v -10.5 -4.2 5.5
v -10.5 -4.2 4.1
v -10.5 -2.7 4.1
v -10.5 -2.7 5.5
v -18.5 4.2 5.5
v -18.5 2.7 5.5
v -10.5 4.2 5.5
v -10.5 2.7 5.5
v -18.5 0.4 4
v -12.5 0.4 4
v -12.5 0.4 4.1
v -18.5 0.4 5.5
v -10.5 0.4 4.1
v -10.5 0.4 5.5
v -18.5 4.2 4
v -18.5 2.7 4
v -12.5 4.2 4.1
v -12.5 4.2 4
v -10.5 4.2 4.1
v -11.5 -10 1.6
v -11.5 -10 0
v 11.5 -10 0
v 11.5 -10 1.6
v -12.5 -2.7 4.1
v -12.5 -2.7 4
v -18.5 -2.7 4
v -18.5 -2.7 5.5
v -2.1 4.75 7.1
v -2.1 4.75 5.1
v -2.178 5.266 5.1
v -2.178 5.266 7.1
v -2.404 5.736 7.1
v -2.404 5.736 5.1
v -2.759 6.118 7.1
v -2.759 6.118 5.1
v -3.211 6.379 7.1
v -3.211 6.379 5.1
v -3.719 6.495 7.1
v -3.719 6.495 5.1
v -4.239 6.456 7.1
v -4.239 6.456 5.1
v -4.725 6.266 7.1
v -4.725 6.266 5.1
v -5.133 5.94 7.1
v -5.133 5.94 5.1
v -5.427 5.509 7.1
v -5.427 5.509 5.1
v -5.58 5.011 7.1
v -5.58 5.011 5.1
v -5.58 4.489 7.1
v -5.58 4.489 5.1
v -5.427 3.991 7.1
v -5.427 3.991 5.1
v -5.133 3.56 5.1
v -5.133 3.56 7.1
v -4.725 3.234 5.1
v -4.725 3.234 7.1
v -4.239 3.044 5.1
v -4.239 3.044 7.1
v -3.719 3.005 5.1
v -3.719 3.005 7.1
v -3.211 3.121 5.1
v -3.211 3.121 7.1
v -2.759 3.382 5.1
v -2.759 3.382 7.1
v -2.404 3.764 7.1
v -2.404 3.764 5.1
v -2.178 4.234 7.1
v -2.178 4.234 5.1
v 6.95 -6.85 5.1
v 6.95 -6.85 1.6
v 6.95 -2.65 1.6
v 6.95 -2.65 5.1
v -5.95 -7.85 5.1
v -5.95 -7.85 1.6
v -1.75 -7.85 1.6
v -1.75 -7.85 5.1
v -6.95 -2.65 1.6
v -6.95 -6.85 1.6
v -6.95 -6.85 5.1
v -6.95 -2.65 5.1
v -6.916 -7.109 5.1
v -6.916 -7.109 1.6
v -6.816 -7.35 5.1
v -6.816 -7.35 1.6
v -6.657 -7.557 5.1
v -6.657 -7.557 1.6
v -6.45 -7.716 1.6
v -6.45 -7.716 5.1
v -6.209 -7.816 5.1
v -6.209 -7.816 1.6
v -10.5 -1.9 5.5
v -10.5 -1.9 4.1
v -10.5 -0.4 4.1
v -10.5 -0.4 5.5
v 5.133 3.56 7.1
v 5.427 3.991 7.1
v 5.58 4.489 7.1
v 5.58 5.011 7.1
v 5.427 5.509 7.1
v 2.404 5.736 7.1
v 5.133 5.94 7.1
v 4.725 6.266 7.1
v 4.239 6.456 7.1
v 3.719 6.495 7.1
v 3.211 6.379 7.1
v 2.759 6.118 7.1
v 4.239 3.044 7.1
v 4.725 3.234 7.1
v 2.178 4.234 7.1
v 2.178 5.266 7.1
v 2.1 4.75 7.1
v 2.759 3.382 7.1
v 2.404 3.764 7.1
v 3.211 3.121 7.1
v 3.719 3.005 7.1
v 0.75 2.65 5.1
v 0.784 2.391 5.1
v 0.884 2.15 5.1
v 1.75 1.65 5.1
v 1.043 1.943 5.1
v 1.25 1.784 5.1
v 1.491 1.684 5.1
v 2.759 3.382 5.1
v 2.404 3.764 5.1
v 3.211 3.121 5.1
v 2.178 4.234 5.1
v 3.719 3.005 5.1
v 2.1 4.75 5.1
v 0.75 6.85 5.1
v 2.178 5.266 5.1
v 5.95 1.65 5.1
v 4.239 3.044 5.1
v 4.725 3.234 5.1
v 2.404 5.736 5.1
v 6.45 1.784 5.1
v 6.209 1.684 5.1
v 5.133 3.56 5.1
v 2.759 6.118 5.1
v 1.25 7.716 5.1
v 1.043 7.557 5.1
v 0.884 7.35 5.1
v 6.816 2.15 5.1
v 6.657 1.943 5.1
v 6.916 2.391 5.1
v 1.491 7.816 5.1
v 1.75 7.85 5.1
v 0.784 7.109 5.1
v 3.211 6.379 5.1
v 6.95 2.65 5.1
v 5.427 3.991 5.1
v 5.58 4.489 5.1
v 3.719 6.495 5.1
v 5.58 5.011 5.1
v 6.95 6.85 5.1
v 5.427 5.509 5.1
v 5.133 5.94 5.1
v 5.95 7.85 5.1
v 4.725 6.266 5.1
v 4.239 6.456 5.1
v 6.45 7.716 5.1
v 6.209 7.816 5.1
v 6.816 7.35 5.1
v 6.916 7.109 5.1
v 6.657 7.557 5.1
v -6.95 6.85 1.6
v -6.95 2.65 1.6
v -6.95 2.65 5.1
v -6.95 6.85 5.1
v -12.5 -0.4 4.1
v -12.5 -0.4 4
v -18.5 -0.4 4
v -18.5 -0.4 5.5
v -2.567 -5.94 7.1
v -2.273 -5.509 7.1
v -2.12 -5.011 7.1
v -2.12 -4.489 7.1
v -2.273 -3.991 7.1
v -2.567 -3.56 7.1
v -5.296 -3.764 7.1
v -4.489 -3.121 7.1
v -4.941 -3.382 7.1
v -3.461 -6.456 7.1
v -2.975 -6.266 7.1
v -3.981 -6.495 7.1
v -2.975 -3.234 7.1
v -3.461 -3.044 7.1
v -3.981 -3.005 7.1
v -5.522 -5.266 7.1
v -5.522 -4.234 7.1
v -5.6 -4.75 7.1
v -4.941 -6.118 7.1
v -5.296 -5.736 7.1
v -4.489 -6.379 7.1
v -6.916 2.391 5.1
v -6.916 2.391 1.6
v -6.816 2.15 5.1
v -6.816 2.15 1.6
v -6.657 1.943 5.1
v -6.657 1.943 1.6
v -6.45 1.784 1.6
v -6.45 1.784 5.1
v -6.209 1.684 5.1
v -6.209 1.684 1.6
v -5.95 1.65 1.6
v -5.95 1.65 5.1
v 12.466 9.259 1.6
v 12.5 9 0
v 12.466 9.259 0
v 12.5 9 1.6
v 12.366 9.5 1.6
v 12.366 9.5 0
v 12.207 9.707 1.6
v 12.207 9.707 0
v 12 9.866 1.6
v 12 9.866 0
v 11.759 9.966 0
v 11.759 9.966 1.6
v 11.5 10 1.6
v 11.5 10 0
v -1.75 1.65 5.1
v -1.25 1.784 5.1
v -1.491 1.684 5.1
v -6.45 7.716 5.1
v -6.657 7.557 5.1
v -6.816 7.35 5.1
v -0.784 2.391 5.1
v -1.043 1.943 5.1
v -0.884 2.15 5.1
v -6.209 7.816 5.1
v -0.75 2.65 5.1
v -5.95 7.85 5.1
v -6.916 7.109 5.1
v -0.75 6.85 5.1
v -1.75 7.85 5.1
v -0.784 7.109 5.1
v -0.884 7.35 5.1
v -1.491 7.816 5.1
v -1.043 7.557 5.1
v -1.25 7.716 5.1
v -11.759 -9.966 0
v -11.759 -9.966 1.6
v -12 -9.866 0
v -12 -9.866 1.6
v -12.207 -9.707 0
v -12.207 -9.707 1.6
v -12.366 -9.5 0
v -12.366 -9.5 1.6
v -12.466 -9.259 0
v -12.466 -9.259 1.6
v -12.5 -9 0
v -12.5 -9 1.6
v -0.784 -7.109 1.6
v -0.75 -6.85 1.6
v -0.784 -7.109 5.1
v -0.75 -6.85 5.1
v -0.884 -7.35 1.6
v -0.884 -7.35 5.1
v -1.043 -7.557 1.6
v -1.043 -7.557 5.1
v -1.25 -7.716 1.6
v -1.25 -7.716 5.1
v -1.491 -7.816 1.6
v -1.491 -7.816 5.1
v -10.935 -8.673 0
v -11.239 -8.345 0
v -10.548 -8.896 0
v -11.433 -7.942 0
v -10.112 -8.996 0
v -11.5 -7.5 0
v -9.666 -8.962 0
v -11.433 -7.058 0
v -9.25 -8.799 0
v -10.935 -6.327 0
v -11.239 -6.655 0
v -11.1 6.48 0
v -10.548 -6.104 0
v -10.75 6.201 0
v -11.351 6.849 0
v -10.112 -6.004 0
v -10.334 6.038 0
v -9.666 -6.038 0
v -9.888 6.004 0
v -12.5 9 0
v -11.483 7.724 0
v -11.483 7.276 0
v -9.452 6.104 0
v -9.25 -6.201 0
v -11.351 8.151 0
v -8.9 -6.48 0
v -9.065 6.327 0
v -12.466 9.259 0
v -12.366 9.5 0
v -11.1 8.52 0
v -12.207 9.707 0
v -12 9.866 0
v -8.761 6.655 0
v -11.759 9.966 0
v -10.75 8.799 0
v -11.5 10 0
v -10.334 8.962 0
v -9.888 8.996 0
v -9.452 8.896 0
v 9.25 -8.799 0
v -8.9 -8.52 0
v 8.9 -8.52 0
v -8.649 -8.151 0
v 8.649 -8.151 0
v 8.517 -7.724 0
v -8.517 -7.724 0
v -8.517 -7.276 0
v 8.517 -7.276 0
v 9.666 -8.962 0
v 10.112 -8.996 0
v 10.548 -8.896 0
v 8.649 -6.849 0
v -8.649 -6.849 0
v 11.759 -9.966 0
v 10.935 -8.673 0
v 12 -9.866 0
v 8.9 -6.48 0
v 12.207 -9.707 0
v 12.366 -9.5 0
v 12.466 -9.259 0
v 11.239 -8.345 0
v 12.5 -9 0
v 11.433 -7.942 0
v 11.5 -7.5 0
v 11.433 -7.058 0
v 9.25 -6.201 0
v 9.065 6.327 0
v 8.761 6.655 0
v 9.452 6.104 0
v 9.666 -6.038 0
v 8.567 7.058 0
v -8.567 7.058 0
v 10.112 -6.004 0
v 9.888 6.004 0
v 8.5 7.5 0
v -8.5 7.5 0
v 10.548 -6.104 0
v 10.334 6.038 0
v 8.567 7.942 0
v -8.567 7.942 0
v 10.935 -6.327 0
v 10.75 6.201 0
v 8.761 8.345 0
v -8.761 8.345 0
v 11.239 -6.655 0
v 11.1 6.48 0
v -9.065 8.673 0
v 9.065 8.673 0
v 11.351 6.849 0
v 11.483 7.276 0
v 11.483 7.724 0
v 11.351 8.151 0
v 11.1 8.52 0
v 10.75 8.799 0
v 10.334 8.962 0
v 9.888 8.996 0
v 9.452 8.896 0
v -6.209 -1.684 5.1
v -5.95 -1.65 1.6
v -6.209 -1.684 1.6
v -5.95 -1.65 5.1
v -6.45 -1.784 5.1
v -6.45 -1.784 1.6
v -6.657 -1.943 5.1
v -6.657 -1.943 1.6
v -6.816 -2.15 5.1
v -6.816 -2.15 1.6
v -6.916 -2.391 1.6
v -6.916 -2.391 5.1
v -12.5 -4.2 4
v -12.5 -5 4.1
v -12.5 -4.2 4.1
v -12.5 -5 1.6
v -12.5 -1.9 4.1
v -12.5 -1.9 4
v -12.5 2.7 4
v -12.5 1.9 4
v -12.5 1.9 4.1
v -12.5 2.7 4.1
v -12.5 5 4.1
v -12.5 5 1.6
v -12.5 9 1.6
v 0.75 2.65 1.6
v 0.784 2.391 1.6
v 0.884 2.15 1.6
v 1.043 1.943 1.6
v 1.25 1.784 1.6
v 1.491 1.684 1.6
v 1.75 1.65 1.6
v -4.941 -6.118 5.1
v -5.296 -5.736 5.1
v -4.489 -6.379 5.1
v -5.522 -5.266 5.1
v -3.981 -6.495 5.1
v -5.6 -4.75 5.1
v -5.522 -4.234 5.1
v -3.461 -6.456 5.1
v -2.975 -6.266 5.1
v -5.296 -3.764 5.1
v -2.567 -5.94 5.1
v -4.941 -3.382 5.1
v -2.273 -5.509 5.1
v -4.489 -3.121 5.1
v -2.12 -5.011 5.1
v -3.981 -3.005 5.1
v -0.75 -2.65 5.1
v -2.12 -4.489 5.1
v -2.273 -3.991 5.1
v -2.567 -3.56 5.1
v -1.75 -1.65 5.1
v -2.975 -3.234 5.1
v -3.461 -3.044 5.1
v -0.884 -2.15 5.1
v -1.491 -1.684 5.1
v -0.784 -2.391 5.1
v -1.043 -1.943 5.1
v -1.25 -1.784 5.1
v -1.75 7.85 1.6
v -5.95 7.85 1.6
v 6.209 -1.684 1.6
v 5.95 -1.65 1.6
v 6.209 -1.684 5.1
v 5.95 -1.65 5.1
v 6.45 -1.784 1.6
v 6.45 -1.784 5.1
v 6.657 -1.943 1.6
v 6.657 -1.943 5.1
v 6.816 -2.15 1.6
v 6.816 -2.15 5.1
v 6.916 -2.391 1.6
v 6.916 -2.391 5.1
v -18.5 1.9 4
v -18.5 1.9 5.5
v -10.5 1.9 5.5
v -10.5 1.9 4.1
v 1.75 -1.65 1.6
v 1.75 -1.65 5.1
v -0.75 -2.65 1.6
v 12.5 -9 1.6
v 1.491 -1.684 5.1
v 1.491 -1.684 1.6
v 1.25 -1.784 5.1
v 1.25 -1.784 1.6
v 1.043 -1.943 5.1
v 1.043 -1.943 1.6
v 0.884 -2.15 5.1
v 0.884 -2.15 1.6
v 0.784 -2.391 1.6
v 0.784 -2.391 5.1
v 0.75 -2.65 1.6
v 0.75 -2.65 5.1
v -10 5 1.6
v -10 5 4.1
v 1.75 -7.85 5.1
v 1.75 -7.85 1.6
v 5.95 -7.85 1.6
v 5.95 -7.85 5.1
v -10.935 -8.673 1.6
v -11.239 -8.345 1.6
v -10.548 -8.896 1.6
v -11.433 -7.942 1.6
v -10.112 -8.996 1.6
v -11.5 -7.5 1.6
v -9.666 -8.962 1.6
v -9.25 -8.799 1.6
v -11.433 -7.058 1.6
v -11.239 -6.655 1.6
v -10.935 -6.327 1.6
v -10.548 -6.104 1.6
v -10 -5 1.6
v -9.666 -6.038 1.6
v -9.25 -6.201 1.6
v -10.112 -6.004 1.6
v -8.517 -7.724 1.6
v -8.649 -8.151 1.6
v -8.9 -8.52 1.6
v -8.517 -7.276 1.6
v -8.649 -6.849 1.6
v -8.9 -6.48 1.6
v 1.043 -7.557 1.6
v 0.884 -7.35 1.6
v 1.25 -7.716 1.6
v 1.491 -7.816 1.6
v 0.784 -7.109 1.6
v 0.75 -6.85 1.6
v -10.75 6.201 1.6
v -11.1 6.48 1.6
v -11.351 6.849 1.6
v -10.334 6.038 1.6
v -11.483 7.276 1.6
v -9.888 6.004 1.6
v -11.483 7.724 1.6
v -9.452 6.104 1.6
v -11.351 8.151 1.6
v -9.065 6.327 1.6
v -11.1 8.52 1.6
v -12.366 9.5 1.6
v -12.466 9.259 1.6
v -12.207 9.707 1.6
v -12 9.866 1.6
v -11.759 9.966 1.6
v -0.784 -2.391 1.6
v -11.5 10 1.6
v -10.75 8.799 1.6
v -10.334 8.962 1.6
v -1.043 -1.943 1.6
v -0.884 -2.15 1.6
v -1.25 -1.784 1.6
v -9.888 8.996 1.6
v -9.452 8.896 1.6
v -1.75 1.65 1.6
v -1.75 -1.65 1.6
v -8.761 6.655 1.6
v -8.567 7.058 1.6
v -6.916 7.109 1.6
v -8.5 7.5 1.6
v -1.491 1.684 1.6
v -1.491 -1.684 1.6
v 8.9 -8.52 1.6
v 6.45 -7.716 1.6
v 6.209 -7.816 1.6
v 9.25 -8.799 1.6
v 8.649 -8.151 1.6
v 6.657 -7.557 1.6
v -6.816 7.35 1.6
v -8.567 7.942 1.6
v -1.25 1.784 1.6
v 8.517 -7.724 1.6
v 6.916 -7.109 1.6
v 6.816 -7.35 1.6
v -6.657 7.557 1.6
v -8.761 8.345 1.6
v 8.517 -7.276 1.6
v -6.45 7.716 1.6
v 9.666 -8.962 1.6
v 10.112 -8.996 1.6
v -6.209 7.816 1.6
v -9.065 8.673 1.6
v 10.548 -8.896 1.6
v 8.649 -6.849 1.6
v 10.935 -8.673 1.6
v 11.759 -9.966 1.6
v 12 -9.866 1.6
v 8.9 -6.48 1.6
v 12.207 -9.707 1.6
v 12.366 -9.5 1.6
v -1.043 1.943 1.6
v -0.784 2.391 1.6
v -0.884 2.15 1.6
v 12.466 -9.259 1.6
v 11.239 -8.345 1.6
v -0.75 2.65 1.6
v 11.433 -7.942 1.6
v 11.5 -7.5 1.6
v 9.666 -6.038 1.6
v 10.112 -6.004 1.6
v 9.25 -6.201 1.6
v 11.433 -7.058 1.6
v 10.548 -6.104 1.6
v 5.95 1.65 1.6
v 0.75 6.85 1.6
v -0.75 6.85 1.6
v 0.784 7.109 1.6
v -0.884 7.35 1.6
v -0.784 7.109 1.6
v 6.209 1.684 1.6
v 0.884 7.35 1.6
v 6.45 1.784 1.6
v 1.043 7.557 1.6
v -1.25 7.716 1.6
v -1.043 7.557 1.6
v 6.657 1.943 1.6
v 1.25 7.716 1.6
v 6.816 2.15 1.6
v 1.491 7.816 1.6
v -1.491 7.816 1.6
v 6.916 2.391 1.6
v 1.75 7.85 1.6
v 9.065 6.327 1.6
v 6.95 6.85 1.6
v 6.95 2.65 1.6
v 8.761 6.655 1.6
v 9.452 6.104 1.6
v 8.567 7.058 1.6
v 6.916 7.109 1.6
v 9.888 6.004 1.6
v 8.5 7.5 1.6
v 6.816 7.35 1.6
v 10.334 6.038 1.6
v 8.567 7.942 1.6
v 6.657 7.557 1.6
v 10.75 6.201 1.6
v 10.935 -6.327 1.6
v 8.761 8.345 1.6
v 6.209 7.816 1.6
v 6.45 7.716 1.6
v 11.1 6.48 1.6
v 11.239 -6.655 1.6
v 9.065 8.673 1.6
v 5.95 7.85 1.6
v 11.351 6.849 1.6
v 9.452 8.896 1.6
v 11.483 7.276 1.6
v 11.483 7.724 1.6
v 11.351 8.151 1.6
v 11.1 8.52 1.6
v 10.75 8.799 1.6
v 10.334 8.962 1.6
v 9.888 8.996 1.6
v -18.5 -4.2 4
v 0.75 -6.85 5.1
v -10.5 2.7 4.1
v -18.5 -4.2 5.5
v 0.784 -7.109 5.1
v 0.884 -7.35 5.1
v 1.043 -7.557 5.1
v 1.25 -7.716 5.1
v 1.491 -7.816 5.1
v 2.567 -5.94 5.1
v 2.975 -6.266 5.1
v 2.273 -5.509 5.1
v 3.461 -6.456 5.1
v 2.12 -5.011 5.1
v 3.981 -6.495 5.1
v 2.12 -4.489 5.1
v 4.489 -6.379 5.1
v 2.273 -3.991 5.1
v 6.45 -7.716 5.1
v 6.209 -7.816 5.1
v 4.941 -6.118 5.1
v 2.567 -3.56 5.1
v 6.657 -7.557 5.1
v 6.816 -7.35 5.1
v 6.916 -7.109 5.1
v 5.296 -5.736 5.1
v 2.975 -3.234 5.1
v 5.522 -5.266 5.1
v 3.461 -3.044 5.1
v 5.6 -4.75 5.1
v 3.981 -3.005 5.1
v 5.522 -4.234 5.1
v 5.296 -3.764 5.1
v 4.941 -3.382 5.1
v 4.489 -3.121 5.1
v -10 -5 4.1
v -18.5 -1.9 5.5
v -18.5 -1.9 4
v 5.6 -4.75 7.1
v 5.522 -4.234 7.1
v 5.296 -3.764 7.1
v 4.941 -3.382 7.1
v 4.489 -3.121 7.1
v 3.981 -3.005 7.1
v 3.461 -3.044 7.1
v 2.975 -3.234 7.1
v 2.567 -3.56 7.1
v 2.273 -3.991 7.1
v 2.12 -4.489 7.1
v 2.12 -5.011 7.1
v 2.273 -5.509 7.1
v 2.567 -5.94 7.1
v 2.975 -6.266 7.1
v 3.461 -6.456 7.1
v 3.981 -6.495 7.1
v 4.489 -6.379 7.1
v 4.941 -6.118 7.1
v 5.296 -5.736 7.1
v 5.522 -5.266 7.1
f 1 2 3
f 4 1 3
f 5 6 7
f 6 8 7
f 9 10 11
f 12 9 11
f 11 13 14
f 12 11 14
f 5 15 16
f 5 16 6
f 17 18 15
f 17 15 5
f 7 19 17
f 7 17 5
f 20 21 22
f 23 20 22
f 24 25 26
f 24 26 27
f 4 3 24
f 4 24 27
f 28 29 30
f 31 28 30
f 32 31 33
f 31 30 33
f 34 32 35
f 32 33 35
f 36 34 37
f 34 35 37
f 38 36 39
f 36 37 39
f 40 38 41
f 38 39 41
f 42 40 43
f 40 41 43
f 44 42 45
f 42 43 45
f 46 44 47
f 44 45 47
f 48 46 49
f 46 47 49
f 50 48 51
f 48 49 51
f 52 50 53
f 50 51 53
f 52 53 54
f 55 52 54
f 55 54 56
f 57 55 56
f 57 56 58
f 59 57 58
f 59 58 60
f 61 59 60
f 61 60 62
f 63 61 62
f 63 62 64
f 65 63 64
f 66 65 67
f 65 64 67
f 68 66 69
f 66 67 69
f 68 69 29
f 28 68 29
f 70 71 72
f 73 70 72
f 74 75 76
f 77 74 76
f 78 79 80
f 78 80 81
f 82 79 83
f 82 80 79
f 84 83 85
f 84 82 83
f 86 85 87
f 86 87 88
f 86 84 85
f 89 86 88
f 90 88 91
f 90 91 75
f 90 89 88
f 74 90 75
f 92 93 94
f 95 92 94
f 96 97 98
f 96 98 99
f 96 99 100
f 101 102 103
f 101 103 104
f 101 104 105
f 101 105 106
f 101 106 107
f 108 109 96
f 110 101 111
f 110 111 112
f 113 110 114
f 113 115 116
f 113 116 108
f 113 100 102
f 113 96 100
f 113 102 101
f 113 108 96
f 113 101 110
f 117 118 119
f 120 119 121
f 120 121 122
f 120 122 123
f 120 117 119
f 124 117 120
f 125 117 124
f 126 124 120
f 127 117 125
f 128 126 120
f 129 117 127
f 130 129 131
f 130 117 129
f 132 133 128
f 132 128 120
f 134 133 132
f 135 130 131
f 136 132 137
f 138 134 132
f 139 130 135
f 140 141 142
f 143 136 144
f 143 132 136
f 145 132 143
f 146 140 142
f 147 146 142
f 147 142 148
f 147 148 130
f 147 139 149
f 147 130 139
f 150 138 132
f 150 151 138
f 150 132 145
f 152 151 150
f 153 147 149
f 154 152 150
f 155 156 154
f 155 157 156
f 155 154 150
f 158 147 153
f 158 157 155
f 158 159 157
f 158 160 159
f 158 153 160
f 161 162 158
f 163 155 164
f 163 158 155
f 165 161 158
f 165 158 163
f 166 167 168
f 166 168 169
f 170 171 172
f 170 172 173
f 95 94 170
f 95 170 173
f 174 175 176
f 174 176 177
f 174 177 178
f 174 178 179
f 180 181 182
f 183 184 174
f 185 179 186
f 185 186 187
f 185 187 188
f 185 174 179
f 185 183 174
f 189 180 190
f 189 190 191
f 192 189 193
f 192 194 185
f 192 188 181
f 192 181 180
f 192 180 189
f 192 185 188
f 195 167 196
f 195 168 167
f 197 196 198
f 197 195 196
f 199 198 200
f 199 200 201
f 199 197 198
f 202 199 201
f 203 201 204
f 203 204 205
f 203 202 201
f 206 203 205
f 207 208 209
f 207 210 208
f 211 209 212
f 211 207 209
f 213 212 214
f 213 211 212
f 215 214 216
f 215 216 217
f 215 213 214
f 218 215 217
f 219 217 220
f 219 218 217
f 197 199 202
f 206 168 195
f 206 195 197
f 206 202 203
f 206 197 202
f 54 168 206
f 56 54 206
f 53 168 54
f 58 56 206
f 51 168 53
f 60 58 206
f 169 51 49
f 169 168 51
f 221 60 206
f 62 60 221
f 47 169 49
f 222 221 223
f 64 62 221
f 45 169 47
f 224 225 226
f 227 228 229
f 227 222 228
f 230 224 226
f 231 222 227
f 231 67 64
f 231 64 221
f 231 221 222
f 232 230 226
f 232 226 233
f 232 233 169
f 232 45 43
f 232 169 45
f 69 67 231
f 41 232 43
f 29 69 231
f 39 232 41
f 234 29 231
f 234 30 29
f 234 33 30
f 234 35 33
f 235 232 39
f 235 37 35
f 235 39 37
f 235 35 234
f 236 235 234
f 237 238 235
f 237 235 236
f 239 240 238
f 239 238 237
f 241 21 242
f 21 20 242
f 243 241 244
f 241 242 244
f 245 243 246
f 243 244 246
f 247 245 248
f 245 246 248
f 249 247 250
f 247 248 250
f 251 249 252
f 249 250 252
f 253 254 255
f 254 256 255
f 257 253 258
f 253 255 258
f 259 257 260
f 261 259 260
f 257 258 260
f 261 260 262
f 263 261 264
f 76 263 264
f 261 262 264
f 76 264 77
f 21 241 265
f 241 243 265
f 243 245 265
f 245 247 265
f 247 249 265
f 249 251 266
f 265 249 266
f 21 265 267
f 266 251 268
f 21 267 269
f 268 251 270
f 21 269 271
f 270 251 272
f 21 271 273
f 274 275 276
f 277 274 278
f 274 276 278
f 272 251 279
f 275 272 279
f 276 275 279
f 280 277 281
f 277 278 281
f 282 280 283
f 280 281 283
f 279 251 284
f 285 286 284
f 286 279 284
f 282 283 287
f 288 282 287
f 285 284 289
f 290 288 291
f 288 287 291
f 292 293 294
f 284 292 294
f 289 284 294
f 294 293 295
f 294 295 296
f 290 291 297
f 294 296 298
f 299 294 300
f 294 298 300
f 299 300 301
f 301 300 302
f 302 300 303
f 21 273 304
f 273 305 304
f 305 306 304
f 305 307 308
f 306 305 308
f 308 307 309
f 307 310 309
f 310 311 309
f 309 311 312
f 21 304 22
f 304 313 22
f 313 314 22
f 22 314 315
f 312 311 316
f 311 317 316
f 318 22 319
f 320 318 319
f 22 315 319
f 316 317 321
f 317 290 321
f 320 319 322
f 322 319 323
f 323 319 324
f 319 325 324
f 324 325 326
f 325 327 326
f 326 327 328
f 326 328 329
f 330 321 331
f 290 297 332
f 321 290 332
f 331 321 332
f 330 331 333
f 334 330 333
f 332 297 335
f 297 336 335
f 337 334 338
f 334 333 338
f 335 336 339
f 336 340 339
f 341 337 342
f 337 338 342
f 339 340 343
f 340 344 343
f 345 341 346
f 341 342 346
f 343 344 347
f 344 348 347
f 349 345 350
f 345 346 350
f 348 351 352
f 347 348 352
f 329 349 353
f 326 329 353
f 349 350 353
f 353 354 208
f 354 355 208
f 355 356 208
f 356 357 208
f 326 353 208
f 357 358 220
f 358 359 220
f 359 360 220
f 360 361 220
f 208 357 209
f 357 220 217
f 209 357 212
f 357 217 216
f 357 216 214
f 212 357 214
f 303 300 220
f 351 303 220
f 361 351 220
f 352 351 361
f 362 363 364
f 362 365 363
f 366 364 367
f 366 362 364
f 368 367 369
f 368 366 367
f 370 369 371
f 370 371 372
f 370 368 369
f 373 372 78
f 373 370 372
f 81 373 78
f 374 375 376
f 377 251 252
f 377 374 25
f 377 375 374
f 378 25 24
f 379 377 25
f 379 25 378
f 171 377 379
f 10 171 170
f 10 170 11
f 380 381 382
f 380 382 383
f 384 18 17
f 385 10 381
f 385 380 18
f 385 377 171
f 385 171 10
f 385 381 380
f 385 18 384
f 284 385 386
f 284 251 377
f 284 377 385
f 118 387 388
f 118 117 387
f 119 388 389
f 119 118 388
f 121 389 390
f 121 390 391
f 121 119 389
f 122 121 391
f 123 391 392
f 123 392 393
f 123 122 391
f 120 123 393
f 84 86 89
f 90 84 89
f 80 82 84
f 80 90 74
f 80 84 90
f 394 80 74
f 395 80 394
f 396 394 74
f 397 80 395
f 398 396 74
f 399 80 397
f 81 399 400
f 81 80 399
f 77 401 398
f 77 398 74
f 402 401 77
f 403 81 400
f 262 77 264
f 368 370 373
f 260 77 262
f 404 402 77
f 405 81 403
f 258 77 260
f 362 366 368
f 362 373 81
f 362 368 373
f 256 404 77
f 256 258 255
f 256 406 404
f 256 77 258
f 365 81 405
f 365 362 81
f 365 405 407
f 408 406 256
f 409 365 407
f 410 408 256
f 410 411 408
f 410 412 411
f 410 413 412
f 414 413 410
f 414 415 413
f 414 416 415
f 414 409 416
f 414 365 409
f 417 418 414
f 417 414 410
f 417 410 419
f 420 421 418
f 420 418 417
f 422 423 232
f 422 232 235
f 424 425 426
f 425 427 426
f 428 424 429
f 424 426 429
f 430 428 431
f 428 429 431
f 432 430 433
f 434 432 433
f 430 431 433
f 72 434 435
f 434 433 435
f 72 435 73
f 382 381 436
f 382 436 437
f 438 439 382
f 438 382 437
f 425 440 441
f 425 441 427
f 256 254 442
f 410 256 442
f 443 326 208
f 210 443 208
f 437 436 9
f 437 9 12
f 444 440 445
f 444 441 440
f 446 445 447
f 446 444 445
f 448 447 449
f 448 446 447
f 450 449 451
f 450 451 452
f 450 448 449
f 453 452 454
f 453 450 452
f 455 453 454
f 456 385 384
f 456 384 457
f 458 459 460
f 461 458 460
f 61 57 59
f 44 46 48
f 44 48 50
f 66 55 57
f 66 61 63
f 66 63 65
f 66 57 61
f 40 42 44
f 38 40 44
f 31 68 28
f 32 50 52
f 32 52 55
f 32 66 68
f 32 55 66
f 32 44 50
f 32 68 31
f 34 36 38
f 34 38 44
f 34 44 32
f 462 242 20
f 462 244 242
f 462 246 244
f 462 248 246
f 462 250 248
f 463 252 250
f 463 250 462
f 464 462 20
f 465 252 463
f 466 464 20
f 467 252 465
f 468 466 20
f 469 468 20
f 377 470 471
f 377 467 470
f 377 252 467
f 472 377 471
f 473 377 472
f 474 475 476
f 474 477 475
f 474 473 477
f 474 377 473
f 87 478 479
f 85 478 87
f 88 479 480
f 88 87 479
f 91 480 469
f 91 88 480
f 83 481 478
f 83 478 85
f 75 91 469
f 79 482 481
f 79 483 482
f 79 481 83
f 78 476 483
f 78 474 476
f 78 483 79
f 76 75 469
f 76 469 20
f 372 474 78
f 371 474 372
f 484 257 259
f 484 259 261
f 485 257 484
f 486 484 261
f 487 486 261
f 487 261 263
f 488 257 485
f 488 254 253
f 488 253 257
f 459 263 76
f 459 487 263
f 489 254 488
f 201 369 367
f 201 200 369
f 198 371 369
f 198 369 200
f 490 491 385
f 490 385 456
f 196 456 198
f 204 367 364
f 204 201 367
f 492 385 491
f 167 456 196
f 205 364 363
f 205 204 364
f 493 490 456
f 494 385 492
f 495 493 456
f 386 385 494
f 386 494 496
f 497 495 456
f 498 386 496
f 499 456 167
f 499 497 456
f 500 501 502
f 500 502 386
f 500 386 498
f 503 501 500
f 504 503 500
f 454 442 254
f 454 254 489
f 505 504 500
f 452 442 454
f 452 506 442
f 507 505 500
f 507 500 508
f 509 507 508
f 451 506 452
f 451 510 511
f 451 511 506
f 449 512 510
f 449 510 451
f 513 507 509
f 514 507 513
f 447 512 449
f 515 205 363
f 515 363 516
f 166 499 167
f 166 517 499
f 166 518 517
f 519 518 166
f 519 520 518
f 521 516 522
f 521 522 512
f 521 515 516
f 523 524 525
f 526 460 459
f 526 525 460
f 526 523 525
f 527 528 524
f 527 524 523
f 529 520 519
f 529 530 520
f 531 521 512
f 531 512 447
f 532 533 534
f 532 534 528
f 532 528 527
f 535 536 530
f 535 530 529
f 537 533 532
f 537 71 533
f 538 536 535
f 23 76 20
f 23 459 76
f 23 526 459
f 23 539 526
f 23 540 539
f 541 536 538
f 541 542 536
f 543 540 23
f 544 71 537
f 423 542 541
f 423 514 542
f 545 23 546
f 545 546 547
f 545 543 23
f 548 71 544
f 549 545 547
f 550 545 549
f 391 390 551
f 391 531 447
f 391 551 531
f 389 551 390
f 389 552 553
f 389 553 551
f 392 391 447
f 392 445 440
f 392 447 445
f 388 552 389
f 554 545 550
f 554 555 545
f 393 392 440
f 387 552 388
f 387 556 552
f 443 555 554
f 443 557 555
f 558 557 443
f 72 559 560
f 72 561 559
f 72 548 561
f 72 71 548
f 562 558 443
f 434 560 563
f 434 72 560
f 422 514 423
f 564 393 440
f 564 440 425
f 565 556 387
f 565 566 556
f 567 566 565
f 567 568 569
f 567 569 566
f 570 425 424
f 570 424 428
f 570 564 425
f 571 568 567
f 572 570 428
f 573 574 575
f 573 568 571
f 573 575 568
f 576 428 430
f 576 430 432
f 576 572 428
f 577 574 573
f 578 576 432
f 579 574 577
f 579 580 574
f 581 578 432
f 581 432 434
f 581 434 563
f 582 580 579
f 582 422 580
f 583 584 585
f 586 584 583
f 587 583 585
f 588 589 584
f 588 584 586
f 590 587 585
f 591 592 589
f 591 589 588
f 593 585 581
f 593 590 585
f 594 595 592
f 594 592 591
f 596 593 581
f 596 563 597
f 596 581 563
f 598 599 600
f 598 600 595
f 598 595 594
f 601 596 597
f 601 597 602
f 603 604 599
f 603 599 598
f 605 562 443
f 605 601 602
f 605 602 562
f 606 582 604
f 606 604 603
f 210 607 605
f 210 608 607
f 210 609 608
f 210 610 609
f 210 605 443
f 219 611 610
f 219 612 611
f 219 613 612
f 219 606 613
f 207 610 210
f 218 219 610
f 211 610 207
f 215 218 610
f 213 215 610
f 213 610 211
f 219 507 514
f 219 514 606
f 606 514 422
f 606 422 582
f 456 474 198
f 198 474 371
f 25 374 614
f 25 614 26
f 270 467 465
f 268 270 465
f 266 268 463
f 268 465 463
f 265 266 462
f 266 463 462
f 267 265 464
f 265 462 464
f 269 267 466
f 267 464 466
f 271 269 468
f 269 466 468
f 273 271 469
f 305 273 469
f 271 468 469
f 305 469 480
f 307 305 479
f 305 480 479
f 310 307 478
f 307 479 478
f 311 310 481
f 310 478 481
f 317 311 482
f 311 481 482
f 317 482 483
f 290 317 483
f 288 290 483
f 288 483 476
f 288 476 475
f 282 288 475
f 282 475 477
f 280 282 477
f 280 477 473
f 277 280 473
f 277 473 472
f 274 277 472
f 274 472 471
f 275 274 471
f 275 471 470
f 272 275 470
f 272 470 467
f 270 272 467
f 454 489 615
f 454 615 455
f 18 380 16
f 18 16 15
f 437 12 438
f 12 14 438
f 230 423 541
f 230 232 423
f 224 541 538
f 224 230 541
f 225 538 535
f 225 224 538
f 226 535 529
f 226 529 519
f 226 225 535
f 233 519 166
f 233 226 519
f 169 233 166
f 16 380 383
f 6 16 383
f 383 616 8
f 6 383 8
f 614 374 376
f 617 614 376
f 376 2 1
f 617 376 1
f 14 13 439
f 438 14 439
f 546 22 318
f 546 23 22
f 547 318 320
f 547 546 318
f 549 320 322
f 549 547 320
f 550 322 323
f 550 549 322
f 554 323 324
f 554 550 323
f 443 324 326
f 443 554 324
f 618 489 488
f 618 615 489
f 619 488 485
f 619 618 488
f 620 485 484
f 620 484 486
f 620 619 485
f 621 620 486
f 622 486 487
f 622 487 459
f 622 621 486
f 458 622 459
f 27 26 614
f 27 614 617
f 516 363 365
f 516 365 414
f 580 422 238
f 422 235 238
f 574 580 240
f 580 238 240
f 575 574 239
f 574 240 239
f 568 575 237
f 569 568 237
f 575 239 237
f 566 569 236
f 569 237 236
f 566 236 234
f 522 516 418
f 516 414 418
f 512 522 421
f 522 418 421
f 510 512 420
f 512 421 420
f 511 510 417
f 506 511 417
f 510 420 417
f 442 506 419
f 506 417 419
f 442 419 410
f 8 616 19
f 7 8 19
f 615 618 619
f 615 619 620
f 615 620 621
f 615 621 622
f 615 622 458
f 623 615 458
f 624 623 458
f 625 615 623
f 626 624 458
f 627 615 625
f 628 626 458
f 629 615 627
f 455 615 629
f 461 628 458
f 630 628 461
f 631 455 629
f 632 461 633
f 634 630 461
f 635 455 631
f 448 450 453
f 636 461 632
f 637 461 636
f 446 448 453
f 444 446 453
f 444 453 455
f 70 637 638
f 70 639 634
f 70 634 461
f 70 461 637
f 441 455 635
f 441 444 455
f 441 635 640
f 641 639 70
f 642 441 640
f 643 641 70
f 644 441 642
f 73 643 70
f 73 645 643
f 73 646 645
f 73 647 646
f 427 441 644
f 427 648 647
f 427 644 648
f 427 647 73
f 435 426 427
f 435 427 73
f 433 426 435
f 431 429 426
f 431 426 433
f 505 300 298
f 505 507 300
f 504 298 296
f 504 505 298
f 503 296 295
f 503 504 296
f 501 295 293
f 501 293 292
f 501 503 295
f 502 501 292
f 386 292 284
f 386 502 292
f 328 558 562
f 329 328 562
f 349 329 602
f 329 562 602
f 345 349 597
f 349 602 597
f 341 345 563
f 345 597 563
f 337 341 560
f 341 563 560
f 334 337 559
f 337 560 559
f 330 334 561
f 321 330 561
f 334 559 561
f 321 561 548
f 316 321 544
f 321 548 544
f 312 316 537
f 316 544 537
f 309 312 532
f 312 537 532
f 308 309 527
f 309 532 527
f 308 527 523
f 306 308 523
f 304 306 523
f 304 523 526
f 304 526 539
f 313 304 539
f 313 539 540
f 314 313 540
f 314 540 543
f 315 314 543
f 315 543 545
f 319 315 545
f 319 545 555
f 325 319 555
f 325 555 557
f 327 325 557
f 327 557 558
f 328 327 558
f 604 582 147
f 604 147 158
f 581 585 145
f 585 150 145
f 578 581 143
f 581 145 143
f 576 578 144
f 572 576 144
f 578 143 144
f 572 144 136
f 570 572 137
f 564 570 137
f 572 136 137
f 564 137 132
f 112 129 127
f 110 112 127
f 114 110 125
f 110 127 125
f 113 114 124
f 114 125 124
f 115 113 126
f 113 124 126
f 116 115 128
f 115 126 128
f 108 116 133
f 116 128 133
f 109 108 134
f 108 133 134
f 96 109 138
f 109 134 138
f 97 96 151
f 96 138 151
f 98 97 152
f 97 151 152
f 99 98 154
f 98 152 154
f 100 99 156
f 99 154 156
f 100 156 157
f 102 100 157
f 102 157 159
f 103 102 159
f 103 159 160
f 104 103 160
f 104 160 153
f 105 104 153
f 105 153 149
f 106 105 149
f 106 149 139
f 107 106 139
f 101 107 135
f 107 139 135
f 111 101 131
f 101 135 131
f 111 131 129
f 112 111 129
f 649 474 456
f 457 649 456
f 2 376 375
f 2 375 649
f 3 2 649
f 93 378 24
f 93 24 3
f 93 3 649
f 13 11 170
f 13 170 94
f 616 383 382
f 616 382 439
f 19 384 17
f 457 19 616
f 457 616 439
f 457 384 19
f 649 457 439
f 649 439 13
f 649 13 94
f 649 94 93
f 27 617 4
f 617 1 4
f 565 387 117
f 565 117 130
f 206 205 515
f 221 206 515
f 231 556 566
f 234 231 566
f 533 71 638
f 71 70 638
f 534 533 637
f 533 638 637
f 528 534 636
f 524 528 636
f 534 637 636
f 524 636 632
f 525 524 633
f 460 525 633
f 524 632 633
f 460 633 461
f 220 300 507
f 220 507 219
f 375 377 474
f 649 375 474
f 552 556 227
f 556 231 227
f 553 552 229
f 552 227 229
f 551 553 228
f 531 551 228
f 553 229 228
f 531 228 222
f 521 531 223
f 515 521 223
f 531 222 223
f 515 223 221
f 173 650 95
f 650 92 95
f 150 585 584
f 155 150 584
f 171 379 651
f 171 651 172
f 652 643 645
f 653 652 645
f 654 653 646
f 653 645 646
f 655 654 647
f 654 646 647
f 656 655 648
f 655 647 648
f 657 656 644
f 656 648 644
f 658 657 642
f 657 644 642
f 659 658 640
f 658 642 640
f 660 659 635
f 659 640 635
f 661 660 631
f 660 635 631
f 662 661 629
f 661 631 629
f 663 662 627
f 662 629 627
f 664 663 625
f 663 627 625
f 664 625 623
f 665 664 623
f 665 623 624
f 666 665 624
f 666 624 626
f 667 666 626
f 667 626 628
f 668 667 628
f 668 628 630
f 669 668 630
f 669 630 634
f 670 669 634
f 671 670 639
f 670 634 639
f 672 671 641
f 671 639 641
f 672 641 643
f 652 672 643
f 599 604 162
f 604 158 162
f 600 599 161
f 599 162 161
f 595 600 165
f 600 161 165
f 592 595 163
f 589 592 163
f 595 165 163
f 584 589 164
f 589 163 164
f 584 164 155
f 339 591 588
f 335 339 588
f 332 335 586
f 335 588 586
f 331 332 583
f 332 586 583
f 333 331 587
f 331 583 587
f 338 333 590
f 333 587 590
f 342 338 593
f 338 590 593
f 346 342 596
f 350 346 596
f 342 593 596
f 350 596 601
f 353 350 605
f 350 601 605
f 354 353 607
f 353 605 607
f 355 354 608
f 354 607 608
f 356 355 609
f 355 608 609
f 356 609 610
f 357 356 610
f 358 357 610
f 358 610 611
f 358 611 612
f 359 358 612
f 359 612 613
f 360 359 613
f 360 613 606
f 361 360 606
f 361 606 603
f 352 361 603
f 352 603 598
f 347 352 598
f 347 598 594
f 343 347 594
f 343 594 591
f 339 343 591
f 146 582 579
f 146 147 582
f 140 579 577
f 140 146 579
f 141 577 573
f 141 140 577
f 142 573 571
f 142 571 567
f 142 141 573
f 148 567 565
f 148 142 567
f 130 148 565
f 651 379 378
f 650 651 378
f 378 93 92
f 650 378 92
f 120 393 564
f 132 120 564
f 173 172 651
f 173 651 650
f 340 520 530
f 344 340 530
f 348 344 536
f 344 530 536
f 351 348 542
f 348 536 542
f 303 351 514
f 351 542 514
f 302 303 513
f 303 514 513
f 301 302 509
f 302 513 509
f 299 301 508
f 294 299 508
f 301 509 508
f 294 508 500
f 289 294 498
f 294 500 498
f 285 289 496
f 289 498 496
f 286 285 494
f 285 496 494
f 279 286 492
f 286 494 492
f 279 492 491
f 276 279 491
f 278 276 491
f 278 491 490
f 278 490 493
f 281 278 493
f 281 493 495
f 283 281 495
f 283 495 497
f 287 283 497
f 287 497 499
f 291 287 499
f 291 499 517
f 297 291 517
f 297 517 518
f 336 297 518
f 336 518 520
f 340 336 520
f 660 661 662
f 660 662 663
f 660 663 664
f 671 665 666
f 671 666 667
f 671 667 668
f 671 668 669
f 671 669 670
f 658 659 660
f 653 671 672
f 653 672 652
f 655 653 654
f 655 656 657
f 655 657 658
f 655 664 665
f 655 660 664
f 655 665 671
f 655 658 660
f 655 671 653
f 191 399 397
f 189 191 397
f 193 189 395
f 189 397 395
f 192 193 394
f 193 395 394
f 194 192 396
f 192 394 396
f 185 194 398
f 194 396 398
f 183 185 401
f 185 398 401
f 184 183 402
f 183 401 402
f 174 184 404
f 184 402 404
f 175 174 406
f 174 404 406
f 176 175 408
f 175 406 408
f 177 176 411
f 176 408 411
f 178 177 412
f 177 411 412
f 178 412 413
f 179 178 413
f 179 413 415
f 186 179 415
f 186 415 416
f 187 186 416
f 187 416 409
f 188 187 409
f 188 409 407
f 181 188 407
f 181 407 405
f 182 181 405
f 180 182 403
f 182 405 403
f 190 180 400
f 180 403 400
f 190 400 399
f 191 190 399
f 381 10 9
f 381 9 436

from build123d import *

# Parameters (mm, degrees)
SKETCH1_W           = 25
SKETCH1_H           = 20
BOSS_EXTRUDE1_DEPTH = 1.6
SKETCH2_W           = 6.2
SKETCH2_H           = 6.2
BOSS_EXTRUDE2_DEPTH = 3.5
SKETCH3_R           = 1.75
BOSS_EXTRUDE3_DEPTH = 2
SKETCH4_R           = 1.5
CUT_EXTRUDE1_DEPTH  = 17.92631088
SKETCH5_W           = 2.5
SKETCH5_H           = 10
BOSS_EXTRUDE4_DEPTH = 2.5
SKETCH6_W           = 1.5
SKETCH6_H           = 1.5
BOSS_EXTRUDE5_DEPTH = 1.4
SKETCH7_W           = 1.5
SKETCH7_H           = 1.5
BOSS_EXTRUDE6_DEPTH = 6.5
FILLET1_R           = 1


with BuildPart() as part:
    # Sketch1 → Boss-Extrude1 (new body)
    with BuildSketch(Plane.XY):
        Rectangle(SKETCH1_W, SKETCH1_H)
    extrude(amount=BOSS_EXTRUDE1_DEPTH)

    # Sketch2 → Boss-Extrude2 (add)
    with BuildSketch(Plane.XY.offset(1.6)):
        with Locations((3.85, 4.75)):
            Rectangle(SKETCH2_W, SKETCH2_H)
        with Locations((-3.85, 4.75)):
            Rectangle(SKETCH2_W, SKETCH2_H)
        with Locations((3.85, -4.75)):
            Rectangle(SKETCH2_W, SKETCH2_H)
        with Locations((-3.85, -4.75)):
            Rectangle(SKETCH2_W, SKETCH2_H)
    extrude(amount=BOSS_EXTRUDE2_DEPTH)

    # Sketch3 → Boss-Extrude3 (add)
    with BuildSketch(Plane.XY.offset(5.1)):
        with Locations((-3.85, 4.75)):
            Circle(SKETCH3_R)
        with Locations(Location((3.85, 4.75, 0), (0, 0, 180))):
            Circle(SKETCH3_R)
        with Locations((3.85, -4.75)):
            Circle(SKETCH3_R)
        with Locations(Location((-3.85, -4.75, 0), (0, 0, 180))):
            Circle(SKETCH3_R)
    extrude(amount=BOSS_EXTRUDE3_DEPTH)

    # Sketch4 → Cut-Extrude1 (cut, through all)
    with BuildSketch(Plane.XY.offset(1.6)):
        with Locations((-10, 7.5)):
            Circle(SKETCH4_R)
        with Locations(Location((10, 7.5, 0), (0, 0, 180))):
            Circle(SKETCH4_R)
        with Locations((10, -7.5)):
            Circle(SKETCH4_R)
        with Locations(Location((-10, -7.5, 0), (0, 0, 180))):
            Circle(SKETCH4_R)
    extrude(amount=-CUT_EXTRUDE1_DEPTH, mode=Mode.SUBTRACT)

    # Sketch5 → Boss-Extrude4 (add)
    with BuildSketch(Plane.XY.offset(1.6)):
        with Locations((-11.25, 0)):
            Rectangle(SKETCH5_W, SKETCH5_H)
    extrude(amount=BOSS_EXTRUDE4_DEPTH)

    # Sketch6 → Boss-Extrude5 (add)
    with BuildSketch(Plane.XY.offset(4.1)):
        with Locations((-11.25, -3.45)):
            Rectangle(SKETCH6_W, SKETCH6_H)
        with Locations((-11.25, -1.15)):
            Rectangle(SKETCH6_W, SKETCH6_H)
        with Locations((-11.25, 1.15)):
            Rectangle(SKETCH6_W, SKETCH6_H)
        with Locations((-11.25, 3.45)):
            Rectangle(SKETCH6_W, SKETCH6_H)
    extrude(amount=BOSS_EXTRUDE5_DEPTH)

    # Sketch7 → Boss-Extrude6 (add)
    with BuildSketch(Plane.ZY.offset(12)):
        with Locations((4.75, -3.45)):
            Rectangle(SKETCH7_W, SKETCH7_H)
        with Locations((4.75, -1.15)):
            Rectangle(SKETCH7_W, SKETCH7_H)
        with Locations((4.75, 1.15)):
            Rectangle(SKETCH7_W, SKETCH7_H)
        with Locations((4.75, 3.45)):
            Rectangle(SKETCH7_W, SKETCH7_H)
    extrude(amount=BOSS_EXTRUDE6_DEPTH)

    # Fillet1
    fillet1_edges = [part.edges().sort_by_distance(p)[0] for p in [
        (-6.95, -1.65, 3.35),
        (-6.95, -7.85, 3.35),
        (-0.75, -7.85, 3.35),
        (-0.75, -1.65, 3.35),
        (6.95, -1.65, 3.35),
        (0.75, -1.65, 3.35),
        (0.75, -7.85, 3.35),
        (6.95, -7.85, 3.35),
        (6.95, 1.65, 3.35),
        (6.95, 7.85, 3.35),
        (0.75, 7.85, 3.35),
        (0.75, 1.65, 3.35),
        (-0.75, 1.65, 3.35),
        (-0.75, 7.85, 3.35),
        (-6.95, 7.85, 3.35),
        (-6.95, 1.65, 3.35),
        (12.5, -10, 0.8),
        (-12.5, -10, 0.8),
        (-12.5, 10, 0.8),
        (12.5, 10, 0.8),
    ]]
    fillet(fillet1_edges, radius=FILLET1_R)


solid = part.part
